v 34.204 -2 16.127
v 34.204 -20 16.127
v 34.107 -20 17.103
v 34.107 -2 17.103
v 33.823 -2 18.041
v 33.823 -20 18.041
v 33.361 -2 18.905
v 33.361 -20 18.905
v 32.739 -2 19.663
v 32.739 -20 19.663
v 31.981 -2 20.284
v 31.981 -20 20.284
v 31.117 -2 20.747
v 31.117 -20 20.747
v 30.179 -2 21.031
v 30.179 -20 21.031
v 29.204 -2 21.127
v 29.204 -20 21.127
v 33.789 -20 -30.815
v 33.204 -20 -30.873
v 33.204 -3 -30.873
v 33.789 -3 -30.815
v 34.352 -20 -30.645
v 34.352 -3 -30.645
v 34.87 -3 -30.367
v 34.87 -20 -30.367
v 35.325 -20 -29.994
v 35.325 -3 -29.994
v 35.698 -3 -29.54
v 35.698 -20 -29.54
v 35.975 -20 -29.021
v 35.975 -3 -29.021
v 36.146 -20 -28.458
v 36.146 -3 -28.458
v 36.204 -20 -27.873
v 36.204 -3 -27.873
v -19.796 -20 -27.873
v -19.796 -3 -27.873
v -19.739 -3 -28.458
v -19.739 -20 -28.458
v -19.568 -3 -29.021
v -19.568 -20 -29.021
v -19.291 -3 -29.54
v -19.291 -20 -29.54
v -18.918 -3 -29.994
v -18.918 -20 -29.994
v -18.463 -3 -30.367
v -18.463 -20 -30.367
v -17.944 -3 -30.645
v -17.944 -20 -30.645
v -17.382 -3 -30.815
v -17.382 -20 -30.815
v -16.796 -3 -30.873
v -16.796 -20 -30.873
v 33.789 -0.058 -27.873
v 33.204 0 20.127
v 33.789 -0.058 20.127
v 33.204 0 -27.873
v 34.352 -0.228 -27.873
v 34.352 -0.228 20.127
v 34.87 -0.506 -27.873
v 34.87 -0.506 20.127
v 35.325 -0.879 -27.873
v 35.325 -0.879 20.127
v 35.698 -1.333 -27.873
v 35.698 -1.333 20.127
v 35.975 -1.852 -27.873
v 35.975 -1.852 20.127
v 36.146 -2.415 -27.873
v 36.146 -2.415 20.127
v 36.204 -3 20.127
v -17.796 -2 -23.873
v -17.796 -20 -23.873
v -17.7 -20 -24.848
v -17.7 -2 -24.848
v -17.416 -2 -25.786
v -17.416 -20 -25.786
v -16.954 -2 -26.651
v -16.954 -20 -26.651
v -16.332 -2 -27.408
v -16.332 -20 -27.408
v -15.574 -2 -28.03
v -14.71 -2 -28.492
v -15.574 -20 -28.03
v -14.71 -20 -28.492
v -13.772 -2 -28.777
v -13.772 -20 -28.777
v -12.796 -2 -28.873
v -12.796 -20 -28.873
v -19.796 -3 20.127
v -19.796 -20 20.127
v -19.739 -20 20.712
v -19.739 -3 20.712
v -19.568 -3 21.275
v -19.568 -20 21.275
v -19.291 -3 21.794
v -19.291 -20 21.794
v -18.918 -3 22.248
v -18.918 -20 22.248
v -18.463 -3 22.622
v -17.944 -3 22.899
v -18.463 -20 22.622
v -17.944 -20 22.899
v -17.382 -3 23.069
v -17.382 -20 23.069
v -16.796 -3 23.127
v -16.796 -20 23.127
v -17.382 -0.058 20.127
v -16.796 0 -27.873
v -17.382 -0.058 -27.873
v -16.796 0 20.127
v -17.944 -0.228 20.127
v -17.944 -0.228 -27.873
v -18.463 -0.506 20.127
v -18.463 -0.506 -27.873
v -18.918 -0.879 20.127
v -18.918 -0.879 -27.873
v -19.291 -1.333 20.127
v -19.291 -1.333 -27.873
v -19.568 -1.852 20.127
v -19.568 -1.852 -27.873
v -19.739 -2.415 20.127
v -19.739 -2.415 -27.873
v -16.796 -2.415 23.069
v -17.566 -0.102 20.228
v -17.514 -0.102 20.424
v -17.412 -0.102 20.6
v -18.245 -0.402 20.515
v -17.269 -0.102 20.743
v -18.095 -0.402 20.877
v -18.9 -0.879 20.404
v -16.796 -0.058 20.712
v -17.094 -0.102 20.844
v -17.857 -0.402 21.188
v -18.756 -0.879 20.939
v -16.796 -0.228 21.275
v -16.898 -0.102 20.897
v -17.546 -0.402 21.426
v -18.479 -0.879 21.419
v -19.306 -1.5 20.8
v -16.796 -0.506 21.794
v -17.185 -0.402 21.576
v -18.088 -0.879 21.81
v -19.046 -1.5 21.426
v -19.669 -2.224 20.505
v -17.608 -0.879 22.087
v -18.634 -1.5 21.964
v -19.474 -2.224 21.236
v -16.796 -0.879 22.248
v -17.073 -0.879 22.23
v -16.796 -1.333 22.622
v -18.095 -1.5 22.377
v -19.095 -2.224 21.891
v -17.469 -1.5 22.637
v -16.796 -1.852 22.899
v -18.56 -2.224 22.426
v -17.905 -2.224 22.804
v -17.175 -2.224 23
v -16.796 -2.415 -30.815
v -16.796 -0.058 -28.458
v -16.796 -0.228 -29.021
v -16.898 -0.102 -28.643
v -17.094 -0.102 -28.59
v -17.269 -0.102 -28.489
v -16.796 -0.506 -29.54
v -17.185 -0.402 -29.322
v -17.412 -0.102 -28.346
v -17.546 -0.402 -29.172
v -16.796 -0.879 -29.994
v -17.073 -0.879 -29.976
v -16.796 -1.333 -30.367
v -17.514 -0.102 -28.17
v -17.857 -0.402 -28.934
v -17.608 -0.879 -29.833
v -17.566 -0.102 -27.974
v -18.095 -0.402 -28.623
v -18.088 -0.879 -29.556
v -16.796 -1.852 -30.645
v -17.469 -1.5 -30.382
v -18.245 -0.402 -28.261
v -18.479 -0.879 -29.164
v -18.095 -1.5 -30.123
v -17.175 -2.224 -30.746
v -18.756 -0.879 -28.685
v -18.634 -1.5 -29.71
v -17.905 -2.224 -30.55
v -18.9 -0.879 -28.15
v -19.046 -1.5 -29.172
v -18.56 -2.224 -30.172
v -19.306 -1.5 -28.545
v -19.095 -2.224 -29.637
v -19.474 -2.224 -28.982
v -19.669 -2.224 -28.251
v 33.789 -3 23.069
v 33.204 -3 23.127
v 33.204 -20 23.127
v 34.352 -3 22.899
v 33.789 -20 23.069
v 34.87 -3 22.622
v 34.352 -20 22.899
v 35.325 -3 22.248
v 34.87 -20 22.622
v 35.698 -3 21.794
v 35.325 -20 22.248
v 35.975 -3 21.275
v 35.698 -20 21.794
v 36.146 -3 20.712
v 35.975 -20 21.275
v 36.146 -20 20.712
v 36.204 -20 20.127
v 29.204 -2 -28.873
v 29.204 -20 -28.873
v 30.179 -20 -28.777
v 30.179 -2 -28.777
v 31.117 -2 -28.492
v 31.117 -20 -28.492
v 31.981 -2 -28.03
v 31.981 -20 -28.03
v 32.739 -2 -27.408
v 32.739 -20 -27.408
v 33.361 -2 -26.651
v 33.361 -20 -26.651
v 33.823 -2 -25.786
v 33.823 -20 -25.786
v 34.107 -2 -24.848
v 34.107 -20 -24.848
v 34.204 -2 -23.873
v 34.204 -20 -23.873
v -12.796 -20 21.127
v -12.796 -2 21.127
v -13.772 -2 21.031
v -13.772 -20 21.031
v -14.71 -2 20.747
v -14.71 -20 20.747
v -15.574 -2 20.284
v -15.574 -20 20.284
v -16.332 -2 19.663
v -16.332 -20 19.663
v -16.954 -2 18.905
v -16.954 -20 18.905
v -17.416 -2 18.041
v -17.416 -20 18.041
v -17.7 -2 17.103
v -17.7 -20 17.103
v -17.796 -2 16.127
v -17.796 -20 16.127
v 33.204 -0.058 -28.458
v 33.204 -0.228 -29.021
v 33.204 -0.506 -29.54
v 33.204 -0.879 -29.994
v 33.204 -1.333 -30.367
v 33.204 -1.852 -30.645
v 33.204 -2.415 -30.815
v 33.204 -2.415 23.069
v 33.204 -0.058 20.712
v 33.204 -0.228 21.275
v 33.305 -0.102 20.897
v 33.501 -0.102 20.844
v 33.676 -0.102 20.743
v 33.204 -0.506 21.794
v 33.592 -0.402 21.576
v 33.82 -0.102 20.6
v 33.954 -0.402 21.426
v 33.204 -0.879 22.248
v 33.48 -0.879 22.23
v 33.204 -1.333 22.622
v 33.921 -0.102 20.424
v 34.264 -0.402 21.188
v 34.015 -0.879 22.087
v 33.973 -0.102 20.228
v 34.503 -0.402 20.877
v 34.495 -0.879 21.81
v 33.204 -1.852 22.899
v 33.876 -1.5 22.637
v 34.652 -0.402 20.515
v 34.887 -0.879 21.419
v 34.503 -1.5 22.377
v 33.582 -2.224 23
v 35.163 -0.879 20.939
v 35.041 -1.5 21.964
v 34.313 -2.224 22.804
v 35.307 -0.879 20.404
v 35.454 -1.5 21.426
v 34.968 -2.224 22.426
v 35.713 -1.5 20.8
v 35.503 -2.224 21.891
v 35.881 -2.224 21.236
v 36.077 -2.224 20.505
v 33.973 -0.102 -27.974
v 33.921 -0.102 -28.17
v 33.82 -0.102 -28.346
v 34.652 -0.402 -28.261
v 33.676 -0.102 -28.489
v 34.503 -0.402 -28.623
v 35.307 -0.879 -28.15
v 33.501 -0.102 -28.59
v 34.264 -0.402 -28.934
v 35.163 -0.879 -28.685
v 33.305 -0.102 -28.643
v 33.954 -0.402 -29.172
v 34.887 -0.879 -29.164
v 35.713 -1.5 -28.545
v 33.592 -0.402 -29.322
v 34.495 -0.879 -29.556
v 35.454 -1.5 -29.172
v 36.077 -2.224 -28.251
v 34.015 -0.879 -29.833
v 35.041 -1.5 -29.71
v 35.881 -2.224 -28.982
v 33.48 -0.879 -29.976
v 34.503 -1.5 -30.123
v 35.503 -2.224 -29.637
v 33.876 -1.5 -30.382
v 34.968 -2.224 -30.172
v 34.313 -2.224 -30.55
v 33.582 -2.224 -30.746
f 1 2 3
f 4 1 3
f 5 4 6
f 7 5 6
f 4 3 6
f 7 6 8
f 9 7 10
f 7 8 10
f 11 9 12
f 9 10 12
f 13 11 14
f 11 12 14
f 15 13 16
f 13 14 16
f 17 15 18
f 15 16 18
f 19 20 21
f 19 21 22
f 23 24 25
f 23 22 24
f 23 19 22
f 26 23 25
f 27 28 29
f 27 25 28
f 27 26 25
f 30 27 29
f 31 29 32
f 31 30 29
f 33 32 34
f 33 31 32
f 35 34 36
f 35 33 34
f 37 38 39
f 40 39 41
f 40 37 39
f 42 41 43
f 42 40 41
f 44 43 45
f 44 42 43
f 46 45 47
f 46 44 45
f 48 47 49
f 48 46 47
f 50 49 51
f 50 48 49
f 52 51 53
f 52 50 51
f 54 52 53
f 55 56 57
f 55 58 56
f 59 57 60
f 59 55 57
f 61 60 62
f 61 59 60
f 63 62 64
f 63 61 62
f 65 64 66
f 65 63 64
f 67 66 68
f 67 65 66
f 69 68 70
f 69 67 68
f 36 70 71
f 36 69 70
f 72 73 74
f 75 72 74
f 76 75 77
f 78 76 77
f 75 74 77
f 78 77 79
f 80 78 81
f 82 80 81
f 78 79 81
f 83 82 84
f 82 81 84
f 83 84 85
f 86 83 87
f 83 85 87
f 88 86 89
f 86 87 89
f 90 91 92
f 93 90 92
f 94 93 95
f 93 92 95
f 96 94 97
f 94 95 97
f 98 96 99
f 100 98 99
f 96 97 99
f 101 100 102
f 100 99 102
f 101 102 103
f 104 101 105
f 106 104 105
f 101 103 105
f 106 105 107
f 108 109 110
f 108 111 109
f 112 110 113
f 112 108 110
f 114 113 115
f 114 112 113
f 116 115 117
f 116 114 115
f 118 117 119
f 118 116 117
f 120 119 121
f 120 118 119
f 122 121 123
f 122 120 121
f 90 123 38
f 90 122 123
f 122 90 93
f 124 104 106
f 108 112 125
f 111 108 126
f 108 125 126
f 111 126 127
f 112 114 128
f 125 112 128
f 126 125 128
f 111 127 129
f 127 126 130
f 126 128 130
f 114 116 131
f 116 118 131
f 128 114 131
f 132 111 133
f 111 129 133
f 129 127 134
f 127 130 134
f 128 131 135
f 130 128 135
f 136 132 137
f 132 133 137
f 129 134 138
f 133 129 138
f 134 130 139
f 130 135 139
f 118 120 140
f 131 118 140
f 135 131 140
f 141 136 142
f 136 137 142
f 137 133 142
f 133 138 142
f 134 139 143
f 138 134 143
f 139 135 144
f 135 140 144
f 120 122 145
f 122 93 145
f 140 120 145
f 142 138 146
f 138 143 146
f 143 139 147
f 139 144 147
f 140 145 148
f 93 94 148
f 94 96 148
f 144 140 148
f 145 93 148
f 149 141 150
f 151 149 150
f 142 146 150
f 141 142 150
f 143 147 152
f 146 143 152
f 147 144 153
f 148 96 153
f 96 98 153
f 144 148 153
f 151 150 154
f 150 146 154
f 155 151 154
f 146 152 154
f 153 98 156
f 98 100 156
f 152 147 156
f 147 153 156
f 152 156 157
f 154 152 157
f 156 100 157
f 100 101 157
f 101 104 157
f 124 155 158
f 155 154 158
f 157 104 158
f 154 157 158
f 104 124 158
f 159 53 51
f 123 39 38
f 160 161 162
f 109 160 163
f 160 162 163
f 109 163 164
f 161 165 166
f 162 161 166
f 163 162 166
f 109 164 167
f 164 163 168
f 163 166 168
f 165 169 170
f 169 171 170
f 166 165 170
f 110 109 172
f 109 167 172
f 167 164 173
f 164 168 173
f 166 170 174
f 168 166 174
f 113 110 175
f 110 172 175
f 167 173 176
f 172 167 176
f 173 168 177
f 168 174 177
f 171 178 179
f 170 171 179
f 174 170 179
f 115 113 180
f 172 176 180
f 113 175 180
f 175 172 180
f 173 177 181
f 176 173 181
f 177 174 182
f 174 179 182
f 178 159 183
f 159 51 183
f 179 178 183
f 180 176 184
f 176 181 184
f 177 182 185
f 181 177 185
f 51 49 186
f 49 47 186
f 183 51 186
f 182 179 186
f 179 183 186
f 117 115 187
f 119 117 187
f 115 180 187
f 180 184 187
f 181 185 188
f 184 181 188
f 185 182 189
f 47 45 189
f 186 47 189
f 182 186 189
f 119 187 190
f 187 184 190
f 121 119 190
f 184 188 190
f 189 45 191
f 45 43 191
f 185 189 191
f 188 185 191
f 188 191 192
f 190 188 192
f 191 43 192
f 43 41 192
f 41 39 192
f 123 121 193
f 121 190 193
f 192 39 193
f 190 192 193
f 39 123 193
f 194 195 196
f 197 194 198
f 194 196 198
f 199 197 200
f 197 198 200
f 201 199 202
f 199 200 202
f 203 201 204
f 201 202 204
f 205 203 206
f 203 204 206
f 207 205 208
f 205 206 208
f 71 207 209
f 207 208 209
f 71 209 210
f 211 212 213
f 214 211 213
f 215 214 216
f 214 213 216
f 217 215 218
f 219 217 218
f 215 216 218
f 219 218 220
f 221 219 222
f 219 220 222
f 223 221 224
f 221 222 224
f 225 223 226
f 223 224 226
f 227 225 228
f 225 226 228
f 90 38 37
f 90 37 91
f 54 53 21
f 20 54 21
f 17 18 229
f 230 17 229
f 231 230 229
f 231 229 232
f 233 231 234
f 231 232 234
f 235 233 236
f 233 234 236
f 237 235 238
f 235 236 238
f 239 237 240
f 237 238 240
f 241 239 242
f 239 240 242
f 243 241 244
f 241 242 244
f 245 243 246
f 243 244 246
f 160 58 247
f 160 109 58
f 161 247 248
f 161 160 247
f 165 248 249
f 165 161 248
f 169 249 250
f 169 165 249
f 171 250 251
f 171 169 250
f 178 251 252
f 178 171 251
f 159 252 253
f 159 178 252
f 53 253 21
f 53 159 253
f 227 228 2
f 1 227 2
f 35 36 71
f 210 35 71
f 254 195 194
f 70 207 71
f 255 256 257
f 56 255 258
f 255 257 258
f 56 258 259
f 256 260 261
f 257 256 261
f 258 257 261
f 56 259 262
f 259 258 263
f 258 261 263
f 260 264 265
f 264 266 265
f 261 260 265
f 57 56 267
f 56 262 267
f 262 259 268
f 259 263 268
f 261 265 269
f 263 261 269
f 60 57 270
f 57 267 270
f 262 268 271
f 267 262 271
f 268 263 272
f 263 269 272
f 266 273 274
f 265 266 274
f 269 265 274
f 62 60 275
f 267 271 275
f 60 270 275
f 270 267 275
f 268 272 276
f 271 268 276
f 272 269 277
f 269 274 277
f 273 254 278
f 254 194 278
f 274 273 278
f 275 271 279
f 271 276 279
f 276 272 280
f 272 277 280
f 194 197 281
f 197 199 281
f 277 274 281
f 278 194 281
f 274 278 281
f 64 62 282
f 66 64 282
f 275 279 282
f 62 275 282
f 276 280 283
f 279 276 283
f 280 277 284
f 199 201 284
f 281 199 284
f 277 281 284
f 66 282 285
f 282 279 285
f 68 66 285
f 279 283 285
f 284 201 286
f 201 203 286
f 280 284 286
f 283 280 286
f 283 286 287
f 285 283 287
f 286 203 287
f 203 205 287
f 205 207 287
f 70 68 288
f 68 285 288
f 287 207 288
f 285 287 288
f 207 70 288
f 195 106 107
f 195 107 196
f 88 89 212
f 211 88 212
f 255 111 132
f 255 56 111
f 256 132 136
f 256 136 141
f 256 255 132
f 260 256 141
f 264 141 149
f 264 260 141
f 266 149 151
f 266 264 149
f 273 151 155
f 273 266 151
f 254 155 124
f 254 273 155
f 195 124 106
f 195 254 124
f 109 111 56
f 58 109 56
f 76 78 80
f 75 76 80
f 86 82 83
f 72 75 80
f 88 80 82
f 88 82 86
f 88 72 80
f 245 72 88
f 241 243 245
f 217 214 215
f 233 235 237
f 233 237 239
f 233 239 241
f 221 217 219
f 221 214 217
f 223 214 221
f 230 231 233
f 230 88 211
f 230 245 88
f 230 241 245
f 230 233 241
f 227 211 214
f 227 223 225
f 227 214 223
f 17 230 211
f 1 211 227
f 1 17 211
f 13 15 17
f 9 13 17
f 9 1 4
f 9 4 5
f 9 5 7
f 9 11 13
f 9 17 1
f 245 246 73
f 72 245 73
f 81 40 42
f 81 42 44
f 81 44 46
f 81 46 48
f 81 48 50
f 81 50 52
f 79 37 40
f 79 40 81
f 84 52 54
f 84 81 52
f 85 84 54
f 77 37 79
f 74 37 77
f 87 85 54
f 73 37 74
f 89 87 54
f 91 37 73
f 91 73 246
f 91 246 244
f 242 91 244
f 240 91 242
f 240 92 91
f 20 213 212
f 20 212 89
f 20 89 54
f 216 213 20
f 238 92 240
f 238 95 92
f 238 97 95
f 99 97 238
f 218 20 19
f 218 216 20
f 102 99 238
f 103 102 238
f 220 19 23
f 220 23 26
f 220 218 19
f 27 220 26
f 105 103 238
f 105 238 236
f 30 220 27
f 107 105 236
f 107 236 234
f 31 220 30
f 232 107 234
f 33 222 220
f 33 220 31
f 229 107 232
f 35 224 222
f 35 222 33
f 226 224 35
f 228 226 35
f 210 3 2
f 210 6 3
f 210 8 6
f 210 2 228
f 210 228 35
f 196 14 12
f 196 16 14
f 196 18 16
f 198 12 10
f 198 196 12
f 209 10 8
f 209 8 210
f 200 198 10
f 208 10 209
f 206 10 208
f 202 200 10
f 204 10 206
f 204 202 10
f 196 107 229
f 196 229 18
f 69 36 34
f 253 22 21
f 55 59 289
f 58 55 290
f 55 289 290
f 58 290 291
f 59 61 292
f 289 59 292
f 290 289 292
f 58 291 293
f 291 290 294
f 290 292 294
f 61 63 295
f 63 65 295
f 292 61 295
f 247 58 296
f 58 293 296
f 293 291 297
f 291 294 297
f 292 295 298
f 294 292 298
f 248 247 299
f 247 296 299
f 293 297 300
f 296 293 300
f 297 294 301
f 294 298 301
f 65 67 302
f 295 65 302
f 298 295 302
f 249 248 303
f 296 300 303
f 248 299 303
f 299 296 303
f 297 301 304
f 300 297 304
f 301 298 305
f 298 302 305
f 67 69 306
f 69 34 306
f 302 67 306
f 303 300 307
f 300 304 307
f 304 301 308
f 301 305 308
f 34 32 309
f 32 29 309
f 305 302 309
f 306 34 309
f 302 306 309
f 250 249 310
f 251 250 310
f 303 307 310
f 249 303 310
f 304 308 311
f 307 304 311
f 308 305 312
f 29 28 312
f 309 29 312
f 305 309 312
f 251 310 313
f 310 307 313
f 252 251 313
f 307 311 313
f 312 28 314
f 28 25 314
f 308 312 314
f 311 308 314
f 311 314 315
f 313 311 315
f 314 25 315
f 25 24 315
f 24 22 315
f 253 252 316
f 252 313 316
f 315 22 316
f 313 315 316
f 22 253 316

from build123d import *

# Parameters (mm, degrees)
F0_W     = 56
F0_H     = 54
F1_DEPTH = 20
F3_DEPTH = 18
F4_R     = 3
F5_R     = 3


with BuildPart() as f1:
    # F0 (on Front) → F1 (new body)
    with BuildSketch(Plane.XZ):
        with Locations((8.203572, -3.872868)):
            Rectangle(F0_W, F0_H)
    extrude(amount=F1_DEPTH)

    # F2 (on face) → F3 (cut)
    with BuildSketch(Plane.XZ.offset(20)):
        with BuildLine():
            Line((29.203572, 21.127132), (-12.796428, 21.127132))
            ThreePointArc((-12.796428, 21.127132), (-16.331962, 19.662666), (-17.796428, 16.127132))
            Line((-17.796428, 16.127132), (-17.796428, -23.872868))
            ThreePointArc((-17.796428, -23.872868), (-16.331962, -27.408402), (-12.796428, -28.872868))
            Line((-12.796428, -28.872868), (29.203572, -28.872868))
            ThreePointArc((29.203572, -28.872868), (32.739106, -27.408402), (34.203572, -23.872868))
            Line((34.203572, -23.872868), (34.203572, 16.127132))
            ThreePointArc((34.203572, 16.127132), (32.739106, 19.662666), (29.203572, 21.127132))
        make_face()
    extrude(amount=-F3_DEPTH, mode=Mode.SUBTRACT)

    # F4
    f4_edges = [f1.edges().sort_by_distance(p)[0] for p in [
        (36.203572, -10, 23.127132),
        (-19.796428, -10, 23.127132),
        (36.203572, -10, -30.872868),
        (-19.796428, -10, -30.872868),
    ]]
    fillet(f4_edges, radius=F4_R)

    # F5
    f5_edges = [f1.edges().sort_by_distance(p)[0] for p in [
        (8.203572, 0, 23.127132),
    ]]
    fillet(f5_edges, radius=F5_R)


solid = f1.part
